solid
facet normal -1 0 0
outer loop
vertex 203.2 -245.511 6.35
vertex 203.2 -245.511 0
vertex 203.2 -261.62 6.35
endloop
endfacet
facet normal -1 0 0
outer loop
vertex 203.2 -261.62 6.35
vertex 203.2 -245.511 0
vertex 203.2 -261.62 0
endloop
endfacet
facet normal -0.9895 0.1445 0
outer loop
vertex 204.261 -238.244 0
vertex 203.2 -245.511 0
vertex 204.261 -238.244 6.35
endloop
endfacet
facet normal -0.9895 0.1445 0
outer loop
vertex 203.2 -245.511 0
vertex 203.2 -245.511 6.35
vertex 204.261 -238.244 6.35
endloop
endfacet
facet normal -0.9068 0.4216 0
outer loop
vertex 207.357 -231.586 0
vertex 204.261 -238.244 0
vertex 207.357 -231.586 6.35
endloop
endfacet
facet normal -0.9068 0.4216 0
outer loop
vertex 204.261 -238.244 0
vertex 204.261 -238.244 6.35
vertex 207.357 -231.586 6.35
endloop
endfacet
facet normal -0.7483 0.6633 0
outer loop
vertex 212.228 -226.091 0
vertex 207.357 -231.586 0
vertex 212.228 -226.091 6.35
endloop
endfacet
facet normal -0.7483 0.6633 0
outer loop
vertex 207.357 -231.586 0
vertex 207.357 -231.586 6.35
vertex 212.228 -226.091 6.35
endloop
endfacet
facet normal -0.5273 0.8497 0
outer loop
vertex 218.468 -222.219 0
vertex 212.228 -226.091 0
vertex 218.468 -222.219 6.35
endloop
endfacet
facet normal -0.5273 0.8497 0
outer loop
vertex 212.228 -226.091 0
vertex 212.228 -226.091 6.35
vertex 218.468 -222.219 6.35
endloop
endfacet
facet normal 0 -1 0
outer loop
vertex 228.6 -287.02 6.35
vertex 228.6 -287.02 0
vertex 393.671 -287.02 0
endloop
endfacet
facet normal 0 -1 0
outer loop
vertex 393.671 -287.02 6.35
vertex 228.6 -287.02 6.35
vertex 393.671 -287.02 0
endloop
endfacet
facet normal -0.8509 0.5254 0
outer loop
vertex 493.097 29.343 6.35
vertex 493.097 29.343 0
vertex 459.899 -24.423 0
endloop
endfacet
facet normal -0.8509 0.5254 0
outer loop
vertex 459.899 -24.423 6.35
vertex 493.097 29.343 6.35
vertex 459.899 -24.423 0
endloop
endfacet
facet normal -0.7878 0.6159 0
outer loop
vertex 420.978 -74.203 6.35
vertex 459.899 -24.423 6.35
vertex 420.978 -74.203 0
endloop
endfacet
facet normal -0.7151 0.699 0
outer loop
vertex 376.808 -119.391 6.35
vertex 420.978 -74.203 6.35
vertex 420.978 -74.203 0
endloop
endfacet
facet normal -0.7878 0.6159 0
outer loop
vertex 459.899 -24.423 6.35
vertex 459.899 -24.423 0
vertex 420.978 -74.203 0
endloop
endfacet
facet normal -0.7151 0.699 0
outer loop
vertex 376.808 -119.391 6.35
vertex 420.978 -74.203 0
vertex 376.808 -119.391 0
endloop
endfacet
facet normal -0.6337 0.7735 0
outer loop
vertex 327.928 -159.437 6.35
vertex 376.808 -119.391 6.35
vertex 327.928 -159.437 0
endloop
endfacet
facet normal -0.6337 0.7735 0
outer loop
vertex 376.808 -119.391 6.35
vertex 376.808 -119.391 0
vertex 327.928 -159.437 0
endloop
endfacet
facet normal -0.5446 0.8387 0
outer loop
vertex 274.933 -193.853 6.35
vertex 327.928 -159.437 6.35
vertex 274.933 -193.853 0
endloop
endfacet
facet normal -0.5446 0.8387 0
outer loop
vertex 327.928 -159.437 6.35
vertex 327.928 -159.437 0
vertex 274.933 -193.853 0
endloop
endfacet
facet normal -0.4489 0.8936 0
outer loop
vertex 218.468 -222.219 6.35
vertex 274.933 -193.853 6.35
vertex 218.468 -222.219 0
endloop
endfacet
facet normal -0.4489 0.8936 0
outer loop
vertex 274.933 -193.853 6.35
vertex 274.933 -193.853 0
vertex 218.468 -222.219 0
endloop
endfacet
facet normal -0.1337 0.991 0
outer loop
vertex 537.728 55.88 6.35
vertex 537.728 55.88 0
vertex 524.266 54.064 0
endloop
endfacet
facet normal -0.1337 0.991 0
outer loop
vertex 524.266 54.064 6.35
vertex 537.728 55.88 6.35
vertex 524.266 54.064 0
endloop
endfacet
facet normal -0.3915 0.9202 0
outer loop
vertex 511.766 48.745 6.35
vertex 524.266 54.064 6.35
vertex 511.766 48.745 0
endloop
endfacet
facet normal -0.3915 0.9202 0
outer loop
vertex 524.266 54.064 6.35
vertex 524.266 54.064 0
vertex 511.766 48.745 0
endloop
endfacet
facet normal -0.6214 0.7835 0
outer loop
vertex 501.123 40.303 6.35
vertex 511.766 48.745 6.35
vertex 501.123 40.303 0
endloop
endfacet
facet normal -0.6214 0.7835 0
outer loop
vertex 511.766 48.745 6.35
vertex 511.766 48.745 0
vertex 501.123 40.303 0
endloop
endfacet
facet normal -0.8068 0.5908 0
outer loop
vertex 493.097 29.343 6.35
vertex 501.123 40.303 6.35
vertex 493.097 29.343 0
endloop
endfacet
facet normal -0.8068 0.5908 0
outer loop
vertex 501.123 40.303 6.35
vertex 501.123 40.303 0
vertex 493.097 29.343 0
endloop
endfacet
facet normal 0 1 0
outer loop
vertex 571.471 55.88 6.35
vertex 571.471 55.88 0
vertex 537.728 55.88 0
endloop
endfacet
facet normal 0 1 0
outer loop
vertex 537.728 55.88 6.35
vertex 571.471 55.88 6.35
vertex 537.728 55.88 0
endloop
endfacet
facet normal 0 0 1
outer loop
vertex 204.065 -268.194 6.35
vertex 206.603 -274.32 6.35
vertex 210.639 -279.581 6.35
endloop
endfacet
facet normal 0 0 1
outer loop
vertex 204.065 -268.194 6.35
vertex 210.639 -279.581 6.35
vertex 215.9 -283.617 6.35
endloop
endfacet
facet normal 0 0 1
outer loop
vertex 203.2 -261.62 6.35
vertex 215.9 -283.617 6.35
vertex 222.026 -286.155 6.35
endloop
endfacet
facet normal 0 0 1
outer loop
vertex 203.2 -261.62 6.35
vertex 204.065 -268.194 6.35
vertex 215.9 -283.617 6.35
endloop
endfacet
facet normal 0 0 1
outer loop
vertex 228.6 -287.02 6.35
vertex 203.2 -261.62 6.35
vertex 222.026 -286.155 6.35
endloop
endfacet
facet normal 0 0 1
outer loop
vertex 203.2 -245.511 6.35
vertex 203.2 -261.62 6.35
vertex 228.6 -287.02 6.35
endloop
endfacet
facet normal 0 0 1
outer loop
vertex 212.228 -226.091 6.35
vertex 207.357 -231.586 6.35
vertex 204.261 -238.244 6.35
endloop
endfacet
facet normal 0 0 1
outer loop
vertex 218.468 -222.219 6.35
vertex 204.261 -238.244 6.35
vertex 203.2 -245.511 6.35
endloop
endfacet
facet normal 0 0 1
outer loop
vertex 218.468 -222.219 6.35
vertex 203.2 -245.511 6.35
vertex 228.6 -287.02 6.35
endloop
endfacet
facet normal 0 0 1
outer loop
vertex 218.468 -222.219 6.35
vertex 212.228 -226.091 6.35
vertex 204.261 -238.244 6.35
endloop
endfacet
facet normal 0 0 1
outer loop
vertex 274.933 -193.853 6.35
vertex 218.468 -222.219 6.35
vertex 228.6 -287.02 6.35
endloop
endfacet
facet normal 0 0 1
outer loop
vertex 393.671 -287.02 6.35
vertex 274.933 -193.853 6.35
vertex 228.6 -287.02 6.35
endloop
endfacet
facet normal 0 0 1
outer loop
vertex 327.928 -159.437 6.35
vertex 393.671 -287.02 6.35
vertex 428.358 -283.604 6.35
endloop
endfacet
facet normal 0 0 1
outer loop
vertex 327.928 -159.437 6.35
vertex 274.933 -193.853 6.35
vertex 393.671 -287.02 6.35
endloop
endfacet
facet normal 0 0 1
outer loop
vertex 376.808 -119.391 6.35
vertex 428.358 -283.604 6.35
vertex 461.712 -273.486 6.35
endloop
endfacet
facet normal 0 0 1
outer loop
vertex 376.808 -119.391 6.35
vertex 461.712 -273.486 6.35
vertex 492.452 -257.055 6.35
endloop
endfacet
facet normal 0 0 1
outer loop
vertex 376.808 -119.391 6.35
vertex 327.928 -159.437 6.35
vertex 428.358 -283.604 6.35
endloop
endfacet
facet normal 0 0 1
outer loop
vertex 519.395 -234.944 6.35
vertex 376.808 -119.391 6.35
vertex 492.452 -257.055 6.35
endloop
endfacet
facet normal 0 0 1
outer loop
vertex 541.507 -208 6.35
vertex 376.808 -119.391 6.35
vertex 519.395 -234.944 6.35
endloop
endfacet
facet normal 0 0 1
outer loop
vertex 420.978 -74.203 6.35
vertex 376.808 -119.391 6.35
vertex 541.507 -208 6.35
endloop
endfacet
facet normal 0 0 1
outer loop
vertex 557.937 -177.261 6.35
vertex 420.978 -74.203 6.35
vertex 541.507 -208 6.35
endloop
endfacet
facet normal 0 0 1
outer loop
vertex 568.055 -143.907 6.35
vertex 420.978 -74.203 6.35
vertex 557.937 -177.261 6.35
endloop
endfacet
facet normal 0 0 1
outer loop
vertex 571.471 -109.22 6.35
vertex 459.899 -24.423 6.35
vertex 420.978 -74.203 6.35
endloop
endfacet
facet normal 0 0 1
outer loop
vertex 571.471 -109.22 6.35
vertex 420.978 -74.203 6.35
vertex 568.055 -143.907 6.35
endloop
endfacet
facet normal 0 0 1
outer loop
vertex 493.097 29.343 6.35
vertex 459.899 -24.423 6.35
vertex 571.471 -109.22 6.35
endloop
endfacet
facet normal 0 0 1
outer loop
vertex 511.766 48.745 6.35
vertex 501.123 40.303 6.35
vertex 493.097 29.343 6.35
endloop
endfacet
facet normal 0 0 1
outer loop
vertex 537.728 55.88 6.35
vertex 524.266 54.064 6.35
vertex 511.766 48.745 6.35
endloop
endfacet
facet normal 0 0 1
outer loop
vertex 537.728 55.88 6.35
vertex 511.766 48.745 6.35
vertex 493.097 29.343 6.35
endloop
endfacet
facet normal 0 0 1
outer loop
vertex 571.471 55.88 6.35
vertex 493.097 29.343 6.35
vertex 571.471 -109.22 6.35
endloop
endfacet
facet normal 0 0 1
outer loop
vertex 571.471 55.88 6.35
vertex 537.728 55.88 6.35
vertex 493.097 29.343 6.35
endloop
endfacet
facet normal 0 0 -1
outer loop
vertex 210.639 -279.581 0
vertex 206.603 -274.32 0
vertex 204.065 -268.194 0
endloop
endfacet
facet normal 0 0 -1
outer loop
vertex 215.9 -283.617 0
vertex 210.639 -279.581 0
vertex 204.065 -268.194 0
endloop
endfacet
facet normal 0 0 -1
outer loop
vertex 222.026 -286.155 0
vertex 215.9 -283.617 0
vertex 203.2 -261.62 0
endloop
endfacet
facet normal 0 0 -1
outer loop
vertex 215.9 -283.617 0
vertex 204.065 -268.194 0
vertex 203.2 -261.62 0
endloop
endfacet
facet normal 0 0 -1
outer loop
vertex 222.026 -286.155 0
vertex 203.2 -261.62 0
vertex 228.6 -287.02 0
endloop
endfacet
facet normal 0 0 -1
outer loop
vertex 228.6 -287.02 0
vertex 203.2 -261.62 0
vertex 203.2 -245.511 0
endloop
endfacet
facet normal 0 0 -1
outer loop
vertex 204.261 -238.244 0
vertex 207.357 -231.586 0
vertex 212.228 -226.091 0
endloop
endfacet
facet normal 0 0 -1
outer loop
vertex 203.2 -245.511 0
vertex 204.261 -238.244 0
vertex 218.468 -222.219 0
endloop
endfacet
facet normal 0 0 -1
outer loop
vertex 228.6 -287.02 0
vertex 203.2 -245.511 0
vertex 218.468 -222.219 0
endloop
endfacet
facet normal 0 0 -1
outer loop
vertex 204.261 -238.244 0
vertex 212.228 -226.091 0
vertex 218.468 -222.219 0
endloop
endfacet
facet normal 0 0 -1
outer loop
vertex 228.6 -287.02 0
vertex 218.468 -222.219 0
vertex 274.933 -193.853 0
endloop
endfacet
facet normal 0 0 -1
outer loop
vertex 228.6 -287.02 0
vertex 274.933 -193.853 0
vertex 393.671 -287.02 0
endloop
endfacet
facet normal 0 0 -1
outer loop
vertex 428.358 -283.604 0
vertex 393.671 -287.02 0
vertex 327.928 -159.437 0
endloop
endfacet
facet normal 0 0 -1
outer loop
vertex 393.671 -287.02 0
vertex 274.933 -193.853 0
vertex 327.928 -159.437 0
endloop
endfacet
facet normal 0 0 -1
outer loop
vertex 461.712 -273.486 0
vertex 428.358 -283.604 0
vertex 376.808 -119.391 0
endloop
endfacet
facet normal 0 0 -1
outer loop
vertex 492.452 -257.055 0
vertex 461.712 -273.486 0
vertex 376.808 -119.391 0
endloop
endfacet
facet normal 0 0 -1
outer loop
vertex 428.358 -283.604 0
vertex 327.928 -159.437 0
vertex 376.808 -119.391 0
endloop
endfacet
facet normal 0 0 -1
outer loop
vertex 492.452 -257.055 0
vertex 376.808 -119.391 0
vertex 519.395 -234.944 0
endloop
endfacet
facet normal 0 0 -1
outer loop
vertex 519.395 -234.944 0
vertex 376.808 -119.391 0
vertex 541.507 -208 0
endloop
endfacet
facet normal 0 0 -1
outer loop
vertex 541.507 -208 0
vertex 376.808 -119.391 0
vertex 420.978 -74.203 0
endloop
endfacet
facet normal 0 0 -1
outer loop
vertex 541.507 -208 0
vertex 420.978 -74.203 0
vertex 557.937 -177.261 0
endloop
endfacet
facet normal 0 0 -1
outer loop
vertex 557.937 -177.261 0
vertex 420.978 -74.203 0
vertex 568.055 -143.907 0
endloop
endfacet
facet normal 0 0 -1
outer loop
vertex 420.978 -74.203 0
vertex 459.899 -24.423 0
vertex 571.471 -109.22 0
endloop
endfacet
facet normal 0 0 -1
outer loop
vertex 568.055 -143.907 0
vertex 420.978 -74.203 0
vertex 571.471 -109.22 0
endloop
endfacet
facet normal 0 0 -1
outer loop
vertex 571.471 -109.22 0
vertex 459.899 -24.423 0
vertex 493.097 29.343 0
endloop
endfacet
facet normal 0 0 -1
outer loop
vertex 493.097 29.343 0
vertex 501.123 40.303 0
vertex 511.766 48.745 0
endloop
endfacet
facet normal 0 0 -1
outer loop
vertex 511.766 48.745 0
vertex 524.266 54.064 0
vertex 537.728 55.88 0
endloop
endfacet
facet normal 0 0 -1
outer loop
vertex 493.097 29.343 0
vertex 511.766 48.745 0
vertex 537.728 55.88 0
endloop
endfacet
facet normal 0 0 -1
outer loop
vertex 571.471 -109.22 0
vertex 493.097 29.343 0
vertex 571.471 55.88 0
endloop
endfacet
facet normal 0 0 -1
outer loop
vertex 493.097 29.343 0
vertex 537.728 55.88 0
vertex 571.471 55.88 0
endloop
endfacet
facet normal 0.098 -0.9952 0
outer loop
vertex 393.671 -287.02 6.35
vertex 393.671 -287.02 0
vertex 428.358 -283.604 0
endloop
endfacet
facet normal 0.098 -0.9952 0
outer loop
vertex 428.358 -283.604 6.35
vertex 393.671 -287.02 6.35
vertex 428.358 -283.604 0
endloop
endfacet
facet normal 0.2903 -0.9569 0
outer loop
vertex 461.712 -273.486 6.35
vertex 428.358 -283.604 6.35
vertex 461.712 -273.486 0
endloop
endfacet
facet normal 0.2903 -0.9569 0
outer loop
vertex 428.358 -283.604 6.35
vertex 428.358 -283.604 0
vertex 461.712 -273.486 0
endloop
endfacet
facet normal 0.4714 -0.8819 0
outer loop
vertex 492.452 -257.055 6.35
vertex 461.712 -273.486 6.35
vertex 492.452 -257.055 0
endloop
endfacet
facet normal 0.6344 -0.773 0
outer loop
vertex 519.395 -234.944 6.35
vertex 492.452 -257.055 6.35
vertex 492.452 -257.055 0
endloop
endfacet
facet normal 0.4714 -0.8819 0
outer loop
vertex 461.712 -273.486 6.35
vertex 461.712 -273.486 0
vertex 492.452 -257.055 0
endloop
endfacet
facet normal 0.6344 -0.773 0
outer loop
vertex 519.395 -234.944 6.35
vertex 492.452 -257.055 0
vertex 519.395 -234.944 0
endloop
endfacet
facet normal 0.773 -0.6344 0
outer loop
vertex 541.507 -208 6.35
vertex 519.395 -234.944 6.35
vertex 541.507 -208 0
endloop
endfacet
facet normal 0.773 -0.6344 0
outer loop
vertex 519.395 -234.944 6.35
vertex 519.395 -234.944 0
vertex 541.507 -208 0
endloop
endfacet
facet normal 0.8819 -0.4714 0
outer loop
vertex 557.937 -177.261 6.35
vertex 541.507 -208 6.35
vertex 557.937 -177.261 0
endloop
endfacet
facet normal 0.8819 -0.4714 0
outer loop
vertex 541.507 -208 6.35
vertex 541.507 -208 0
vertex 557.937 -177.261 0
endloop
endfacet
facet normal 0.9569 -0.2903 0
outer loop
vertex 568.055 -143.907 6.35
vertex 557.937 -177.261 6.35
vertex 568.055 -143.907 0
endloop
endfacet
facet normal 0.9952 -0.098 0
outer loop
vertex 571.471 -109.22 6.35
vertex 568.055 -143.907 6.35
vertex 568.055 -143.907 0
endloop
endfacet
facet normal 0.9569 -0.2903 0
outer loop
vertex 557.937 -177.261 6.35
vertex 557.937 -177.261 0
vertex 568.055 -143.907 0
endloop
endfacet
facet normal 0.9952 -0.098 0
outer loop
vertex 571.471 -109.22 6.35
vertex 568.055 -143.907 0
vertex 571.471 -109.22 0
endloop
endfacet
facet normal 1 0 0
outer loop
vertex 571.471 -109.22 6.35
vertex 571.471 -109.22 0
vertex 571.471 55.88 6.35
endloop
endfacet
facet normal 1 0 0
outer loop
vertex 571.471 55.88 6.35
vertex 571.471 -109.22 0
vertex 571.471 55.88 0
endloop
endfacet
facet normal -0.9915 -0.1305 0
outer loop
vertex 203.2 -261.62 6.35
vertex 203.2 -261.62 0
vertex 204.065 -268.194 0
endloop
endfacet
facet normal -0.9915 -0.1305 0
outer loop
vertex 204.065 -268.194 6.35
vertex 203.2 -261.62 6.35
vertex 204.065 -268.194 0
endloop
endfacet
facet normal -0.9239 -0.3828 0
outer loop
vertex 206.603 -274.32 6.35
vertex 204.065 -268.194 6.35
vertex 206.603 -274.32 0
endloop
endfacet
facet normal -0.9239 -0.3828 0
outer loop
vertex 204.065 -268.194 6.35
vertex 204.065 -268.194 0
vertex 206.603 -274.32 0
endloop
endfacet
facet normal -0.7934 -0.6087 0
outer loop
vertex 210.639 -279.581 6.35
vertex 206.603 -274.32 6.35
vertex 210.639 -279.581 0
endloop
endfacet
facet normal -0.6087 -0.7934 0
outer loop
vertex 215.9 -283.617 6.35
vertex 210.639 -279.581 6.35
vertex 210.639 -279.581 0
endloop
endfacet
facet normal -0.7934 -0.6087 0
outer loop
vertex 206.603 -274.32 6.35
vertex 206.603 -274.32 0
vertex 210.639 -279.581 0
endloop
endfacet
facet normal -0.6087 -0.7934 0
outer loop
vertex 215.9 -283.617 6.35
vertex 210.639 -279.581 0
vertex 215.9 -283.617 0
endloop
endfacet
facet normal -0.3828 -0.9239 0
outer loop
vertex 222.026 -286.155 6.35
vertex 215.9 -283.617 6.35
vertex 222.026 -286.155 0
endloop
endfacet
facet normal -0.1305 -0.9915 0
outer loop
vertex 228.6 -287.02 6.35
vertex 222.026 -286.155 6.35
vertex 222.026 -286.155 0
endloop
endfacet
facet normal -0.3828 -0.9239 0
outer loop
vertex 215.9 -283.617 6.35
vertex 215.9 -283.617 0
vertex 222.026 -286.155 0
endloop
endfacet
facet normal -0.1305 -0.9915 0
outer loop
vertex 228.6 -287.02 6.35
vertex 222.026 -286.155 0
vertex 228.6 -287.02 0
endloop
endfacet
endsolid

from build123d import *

# Parameters (mm, degrees)
BOSS_EXTRUDE1_DEPTH = 6.35
FILLET1_R           = 25.4


with BuildPart() as part:
    # Sketch1 → Boss-Extrude1 (new body)
    with BuildSketch(Plane.XY):
        with BuildLine():
            Line((203.2, -228.6), (203.2, -261.62))
            ThreePointArc((203.2, -261.62), (210.639487758, -279.580512242), (228.6, -287.02))
            Line((228.6, -287.02), (393.671225938, -287.02))
            ThreePointArc((393.671225938, -287.02), (519.394811633, -234.943585695), (571.471225938, -109.22))
            Line((571.471225938, -109.22), (571.471225938, 55.88))
            Line((571.471225938, 55.88), (537.728452035, 55.88))
            ThreePointArc((537.728452035, 55.88), (511.766359552, 48.744742687), (493.097424953, 29.343376138))
            ThreePointArc((493.097424953, 29.343376138), (370.666792044, -124.935933237), (203.2, -228.6))
        make_face()
    extrude(amount=BOSS_EXTRUDE1_DEPTH)

    # Fillet1
    fillet1_edges = [part.edges().sort_by_distance(p)[0] for p in [
        (203.2, -228.6, 3.175),
    ]]
    fillet(fillet1_edges, radius=FILLET1_R)


solid = part.part
